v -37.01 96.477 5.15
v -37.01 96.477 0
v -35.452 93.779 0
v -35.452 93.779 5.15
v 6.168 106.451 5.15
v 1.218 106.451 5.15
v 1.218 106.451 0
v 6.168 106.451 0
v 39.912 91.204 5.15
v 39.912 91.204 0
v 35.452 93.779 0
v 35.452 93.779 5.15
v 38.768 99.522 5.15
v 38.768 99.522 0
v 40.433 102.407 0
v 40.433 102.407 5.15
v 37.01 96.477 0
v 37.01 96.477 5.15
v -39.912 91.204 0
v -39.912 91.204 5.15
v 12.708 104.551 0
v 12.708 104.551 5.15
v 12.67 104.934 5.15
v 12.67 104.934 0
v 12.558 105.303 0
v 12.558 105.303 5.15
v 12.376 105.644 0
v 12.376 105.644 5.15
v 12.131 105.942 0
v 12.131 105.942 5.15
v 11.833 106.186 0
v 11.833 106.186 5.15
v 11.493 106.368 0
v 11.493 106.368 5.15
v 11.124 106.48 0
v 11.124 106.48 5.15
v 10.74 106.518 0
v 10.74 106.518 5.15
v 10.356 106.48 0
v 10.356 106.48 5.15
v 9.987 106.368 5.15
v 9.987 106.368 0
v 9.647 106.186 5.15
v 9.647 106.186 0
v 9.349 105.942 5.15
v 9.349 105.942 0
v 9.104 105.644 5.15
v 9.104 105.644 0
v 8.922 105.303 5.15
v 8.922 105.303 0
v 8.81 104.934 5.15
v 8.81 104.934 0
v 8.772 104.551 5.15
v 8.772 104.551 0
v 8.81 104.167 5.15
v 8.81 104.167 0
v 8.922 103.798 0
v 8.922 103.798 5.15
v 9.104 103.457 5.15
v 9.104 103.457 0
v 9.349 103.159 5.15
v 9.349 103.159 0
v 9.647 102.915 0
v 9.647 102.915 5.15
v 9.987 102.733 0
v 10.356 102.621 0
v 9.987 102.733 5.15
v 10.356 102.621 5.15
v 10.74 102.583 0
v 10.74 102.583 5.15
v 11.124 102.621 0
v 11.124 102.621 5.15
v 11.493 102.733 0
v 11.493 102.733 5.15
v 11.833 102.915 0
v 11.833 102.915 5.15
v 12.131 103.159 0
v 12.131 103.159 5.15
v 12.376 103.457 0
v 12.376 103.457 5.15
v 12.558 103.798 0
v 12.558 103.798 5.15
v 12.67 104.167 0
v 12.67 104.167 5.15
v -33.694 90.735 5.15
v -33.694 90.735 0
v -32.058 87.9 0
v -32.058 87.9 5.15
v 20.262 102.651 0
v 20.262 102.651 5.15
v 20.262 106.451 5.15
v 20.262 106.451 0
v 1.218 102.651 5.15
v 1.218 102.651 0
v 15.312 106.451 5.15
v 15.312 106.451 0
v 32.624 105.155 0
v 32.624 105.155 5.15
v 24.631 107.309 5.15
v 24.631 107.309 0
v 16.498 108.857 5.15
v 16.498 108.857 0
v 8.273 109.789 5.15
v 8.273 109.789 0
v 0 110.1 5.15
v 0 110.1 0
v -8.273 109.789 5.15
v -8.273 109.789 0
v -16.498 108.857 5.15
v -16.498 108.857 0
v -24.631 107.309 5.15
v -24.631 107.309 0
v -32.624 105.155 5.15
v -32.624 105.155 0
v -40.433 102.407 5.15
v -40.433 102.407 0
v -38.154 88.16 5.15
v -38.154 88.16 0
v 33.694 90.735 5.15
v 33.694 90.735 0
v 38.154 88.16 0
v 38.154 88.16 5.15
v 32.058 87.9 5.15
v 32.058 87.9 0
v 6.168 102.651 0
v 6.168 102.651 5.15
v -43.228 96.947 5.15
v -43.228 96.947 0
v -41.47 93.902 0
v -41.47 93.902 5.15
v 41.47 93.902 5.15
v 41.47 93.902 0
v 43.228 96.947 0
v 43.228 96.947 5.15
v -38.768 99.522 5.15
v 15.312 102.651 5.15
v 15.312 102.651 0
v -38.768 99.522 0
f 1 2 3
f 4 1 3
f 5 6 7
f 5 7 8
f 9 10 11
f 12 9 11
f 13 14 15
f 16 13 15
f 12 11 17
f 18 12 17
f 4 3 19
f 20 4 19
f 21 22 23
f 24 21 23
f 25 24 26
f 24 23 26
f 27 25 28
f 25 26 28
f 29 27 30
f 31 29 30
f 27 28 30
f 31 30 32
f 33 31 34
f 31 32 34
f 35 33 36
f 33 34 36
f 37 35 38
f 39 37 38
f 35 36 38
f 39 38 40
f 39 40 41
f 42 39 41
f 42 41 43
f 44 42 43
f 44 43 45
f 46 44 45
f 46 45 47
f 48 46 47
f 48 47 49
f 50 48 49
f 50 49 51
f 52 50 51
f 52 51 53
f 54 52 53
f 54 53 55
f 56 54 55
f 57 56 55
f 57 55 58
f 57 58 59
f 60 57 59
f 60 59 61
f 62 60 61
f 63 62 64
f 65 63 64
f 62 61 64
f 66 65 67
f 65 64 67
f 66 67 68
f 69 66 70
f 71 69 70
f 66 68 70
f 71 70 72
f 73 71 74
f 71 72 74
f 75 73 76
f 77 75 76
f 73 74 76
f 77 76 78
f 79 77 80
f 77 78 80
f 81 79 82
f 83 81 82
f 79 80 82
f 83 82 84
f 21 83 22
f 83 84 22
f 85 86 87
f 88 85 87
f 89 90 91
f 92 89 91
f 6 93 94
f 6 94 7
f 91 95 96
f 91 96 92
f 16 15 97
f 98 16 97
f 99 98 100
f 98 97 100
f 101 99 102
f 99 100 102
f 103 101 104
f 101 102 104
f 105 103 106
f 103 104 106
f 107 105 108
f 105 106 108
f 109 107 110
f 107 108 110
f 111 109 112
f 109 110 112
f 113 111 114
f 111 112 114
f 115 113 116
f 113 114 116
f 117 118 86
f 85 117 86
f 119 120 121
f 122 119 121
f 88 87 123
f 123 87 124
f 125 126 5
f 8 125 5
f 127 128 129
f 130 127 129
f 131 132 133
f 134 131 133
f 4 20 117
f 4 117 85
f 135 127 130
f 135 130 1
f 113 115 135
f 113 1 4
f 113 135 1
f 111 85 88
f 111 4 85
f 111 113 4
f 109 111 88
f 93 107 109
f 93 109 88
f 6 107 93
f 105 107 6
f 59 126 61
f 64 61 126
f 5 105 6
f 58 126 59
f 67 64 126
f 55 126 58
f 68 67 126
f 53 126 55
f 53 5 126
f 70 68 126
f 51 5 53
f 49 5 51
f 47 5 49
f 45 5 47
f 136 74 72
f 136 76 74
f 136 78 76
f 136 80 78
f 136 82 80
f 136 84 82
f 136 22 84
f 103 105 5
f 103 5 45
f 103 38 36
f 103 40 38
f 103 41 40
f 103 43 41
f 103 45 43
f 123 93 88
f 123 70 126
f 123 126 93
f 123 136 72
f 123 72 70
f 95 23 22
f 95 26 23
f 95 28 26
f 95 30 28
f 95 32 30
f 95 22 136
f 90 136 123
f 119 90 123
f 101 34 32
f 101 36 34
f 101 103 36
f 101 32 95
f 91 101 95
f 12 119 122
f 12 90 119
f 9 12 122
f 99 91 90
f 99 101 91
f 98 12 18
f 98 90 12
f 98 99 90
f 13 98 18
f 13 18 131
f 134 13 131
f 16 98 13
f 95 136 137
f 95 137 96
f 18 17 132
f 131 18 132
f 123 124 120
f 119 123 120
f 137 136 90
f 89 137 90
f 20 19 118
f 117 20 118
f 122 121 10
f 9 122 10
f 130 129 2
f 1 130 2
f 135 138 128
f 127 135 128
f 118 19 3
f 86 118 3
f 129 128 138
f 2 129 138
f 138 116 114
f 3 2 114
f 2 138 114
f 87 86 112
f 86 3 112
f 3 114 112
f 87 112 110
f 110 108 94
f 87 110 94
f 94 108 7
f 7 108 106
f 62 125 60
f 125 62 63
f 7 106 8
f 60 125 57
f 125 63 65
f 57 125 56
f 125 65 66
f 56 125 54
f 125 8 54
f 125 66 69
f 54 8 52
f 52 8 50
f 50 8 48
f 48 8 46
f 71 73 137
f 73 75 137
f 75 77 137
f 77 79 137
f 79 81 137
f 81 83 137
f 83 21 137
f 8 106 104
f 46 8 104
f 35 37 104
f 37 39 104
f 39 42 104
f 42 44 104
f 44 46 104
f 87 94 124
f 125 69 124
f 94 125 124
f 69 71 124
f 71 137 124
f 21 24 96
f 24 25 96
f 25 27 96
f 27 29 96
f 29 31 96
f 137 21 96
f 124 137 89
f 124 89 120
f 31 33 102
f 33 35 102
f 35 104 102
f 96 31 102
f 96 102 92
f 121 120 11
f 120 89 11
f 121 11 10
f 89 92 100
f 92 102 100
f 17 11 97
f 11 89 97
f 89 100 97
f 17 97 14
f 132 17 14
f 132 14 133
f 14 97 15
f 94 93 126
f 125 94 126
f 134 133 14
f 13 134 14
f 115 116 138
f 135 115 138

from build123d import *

# Parameters (mm, degrees)
BOSS_EXTRUDE1_DEPTH = 5.15
SKETCH2_R           = 1.9675
SKETCH2_W           = 4.95
SKETCH2_H           = 3.8
CUT_EXTRUDE1_DEPTH  = 6.15


with BuildPart() as part:
    # Sketch1 → Boss-Extrude1 (new body)
    with BuildSketch(Plane.XY):
        with BuildLine():
            Line((-32.057735027, 87.9), (32.057735027, 87.9))
            Line((32.057735027, 87.9), (33.694332379, 90.734669766))
            Line((33.694332379, 90.734669766), (38.154363209, 88.159669766))
            Line((38.154363209, 88.159669766), (39.912093048, 91.204147153))
            Line((39.912093048, 91.204147153), (35.452062218, 93.779147153))
            Line((35.452062218, 93.779147153), (37.009792057, 96.477214379))
            Line((37.009792057, 96.477214379), (41.469822887, 93.902214379))
            Line((41.469822887, 93.902214379), (43.227552726, 96.946691766))
            Line((43.227552726, 96.946691766), (38.767521896, 99.521691766))
            Line((38.767521896, 99.521691766), (40.433263841, 102.406841447))
            ThreePointArc((40.433263841, 102.406841447), (0, 110.1), (-40.433263841, 102.406841447))
            Line((-40.433263841, 102.406841447), (-38.767521896, 99.521691766))
            Line((-38.767521896, 99.521691766), (-43.227552726, 96.946691766))
            Line((-43.227552726, 96.946691766), (-41.469822887, 93.902214379))
            Line((-41.469822887, 93.902214379), (-37.009792057, 96.477214379))
            Line((-37.009792057, 96.477214379), (-35.452062218, 93.779147153))
            Line((-35.452062218, 93.779147153), (-39.912093048, 91.204147153))
            Line((-39.912093048, 91.204147153), (-38.154363209, 88.159669766))
            Line((-38.154363209, 88.159669766), (-33.694332379, 90.734669766))
            Line((-33.694332379, 90.734669766), (-32.057735027, 87.9))
        make_face()
    extrude(amount=BOSS_EXTRUDE1_DEPTH)

    # Sketch2 → Cut-Extrude1 (cut, through all)
    with BuildSketch(Plane.XY.offset(5.15)):
        with Locations((10.74, 104.550558367)):
            Circle(SKETCH2_R)
        with Locations((17.786830638, 104.550558367)):
            Rectangle(SKETCH2_W, SKETCH2_H)
        with Locations((3.693169362, 104.550558367)):
            Rectangle(SKETCH2_W, SKETCH2_H)
    extrude(amount=-CUT_EXTRUDE1_DEPTH, mode=Mode.SUBTRACT)


solid = part.part
